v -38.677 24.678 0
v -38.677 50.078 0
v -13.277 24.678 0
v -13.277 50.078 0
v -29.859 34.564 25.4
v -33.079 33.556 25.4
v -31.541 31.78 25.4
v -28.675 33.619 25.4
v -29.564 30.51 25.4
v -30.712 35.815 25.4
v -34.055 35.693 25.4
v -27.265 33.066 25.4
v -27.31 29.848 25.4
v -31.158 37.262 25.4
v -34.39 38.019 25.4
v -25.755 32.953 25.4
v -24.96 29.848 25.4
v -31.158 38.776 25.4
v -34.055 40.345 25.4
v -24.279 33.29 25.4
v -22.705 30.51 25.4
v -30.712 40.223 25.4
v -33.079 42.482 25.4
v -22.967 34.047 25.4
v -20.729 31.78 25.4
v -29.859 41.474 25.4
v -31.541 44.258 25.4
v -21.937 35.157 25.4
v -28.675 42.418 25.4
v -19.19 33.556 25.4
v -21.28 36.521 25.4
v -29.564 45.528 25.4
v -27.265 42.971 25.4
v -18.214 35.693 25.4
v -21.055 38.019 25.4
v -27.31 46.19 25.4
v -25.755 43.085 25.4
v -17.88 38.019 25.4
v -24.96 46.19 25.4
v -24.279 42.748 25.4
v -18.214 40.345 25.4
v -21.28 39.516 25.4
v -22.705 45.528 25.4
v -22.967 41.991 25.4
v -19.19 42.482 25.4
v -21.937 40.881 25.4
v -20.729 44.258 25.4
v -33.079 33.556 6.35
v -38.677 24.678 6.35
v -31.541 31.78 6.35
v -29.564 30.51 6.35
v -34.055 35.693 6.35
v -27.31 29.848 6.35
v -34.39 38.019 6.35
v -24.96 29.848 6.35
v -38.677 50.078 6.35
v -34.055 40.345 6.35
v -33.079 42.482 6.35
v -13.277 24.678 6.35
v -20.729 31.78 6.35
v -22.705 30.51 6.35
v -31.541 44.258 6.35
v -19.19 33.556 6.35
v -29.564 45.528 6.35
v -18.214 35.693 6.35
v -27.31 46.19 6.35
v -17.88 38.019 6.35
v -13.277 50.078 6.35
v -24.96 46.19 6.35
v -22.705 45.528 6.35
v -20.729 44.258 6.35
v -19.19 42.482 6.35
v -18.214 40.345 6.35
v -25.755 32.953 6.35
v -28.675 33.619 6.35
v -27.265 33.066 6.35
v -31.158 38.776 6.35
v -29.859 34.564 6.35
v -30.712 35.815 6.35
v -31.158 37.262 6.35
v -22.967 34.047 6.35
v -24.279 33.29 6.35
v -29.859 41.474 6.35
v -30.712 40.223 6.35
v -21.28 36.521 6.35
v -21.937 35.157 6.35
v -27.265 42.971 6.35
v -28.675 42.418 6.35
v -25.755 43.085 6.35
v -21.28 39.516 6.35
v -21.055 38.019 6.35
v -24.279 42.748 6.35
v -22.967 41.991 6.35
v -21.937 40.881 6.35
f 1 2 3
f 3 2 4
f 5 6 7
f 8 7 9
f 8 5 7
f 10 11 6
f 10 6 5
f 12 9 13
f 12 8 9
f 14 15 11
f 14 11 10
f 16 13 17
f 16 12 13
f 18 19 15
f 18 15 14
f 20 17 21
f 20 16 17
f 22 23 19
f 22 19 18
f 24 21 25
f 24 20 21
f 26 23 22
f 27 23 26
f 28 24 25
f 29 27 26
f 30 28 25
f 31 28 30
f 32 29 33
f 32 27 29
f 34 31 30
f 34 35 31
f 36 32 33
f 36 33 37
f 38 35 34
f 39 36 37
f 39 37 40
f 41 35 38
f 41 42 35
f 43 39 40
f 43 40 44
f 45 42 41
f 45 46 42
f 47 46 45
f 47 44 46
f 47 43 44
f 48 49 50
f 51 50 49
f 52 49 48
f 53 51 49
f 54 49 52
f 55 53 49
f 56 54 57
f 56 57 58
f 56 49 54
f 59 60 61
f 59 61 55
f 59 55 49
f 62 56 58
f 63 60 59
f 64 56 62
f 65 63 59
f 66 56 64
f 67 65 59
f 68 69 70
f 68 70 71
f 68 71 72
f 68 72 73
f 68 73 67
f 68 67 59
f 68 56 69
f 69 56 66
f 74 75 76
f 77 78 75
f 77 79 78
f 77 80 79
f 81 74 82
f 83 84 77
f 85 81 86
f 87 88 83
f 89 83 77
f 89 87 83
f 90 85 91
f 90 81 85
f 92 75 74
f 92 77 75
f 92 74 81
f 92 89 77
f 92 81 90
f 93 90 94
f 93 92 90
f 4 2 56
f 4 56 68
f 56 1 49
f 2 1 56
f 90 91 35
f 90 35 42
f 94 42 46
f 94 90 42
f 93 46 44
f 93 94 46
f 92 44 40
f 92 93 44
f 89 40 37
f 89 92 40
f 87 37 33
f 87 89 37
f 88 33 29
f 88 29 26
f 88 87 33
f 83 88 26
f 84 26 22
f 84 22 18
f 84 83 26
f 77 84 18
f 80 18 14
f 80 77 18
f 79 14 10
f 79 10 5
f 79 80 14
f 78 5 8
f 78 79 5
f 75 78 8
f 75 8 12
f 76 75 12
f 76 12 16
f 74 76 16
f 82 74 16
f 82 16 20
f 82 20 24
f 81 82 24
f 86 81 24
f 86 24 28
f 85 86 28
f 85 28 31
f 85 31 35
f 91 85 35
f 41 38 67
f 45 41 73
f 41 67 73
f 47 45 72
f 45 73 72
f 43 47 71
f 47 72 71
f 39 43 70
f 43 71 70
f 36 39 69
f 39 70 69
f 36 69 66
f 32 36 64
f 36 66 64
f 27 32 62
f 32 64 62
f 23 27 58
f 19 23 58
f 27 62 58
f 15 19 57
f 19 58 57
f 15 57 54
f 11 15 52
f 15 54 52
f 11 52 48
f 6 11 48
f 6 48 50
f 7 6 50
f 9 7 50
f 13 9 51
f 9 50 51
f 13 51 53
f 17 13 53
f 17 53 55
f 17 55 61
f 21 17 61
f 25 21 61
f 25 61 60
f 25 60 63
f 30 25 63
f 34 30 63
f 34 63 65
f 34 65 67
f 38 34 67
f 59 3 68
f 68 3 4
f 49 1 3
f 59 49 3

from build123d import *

# Parameters (mm, degrees)
F0_W     = 25.4
F0_H     = 25.4
F1_DEPTH = 6.35
F2_R     = 8.255
F2_R_2   = 5.08
F3_DEPTH = 25.4


with BuildPart() as f1:
    # F0 (on Top) → F1 (new body)
    with BuildSketch(Plane.XY):
        with Locations((-25.977274, 37.378409)):
            Rectangle(F0_W, F0_H)
    extrude(amount=F1_DEPTH)

    # F2 (on Top) → F3 (join)
    with BuildSketch(Plane.XY):
        with Locations((-26.134709, 38.018856)):
            Circle(F2_R)
        with Locations((-26.134709, 38.018856)):
            Circle(F2_R_2, mode=Mode.SUBTRACT)
    extrude(amount=F3_DEPTH)


solid = f1.part
